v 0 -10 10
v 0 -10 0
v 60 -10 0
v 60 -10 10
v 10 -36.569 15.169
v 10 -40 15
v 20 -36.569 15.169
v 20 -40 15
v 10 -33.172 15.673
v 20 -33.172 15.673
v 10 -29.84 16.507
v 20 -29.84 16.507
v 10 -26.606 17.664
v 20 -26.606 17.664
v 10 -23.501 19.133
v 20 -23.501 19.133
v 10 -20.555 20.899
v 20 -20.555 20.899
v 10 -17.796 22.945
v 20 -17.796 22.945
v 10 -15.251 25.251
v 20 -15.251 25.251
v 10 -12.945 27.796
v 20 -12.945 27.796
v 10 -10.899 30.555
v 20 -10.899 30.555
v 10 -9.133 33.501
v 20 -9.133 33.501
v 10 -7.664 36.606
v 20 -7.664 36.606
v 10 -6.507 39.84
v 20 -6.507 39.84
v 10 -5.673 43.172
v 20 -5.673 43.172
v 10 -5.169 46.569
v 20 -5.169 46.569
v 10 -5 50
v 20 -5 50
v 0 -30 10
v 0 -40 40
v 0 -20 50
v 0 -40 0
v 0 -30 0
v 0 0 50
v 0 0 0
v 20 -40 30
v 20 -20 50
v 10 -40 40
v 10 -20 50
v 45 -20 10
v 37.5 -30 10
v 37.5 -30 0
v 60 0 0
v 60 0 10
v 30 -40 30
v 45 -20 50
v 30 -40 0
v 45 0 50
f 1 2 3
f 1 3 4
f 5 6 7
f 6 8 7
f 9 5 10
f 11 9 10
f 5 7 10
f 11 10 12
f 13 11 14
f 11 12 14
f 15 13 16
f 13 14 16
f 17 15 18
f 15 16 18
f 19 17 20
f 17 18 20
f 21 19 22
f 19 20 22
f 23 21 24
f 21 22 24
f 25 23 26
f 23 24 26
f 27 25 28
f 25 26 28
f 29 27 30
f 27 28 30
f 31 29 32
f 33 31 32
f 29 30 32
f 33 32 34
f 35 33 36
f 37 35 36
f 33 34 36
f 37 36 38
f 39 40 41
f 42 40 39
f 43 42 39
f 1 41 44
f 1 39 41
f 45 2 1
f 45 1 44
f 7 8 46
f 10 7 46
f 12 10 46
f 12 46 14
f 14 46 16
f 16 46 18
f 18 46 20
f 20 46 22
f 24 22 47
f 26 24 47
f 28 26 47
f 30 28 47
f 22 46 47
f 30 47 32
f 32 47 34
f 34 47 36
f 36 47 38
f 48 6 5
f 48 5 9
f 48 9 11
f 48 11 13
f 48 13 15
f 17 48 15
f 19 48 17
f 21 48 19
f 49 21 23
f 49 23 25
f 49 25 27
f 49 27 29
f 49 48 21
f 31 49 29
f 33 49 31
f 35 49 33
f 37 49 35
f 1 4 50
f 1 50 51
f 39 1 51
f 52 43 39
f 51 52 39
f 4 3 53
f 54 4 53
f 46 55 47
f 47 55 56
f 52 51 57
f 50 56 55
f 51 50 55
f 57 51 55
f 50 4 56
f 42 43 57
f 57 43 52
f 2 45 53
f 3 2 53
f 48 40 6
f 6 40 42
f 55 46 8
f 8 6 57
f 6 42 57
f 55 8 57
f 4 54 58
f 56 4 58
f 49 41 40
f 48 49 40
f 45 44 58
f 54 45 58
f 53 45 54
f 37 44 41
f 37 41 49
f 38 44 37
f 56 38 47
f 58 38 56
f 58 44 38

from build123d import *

# Parameters (mm, degrees)
F0_W      = 60
F0_H      = 40
F1_DEPTH  = 50
F3_W      = 10
F3_H      = 35
F5_DEPTH  = 35
F6_R      = 34.99999
F7_DEPTH  = 12.7
F9_DEPTH  = 40
F10_DEPTH = 50.001
F12_DEPTH = 20.001
F13_W     = 20
F13_H     = 10
F14_DEPTH = 60.001


# Not quite as in the source:
# - a fillet or chamfer is up to 0.001 mm smaller than in the source, because OpenCascade refuses the exact size


with BuildPart() as f1:
    # F0 (on Top) → F1 (new body)
    with BuildSketch(Plane.XY):
        with Locations((30, -20)):
            Rectangle(F0_W, F0_H)
    extrude(amount=F1_DEPTH)

    # F3 (on face) → F5 (cut, through all)
    with BuildSketch(Plane.XY.offset(50)):
        with Locations((15, -22.5)):
            Rectangle(F3_W, F3_H)
    extrude(amount=-F5_DEPTH, mode=Mode.SUBTRACT)

    # F6 (radius 35 in the source; OpenCascade refuses exactly that, so slightly less here)
    f6_edges = [f1.edges().sort_by_distance(p)[0] for p in [
        (15, -5, 15),
    ]]
    fillet(f6_edges, radius=F6_R)

    # F2 (on face) → F7 (cut)
    with BuildSketch(Plane(origin=(0, 0, 0), x_dir=(0, -1, 0), z_dir=(-1, 0, 0))):
        Polygon((40, 50), (20, 50), (40, 40), align=None)
    extrude(amount=-F7_DEPTH, mode=Mode.SUBTRACT)

    # F8 (on face) → F9 (cut, through all)
    with BuildSketch(Plane.YZ.offset(60)):
        Polygon((-40, 30), (-20, 50), (-40, 50), align=None)
    extrude(amount=-F9_DEPTH, mode=Mode.SUBTRACT)

    # F3 (on face) → F10 (cut, through all)
    with BuildSketch(Plane.XY.offset(50)):
        Polygon((45, -20), (30, -40), (60, -40), (60, -10), align=None)
    extrude(amount=-F10_DEPTH, mode=Mode.SUBTRACT)

    # F11 (on face) → F12 (cut, through all)
    with BuildSketch(Plane(origin=(0, 0, 0), x_dir=(-1, 0, 0), z_dir=(0, 1, 0))):
        Polygon((-60, 10), (-45, 50), (-60, 50), align=None)
    extrude(amount=-F12_DEPTH, mode=Mode.SUBTRACT)

    # F13 (on face) → F14 (cut, through all)
    with BuildSketch(Plane(origin=(0, 0, 0), x_dir=(0, -1, 0), z_dir=(-1, 0, 0))):
        with Locations((20, 5)):
            Rectangle(F13_W, F13_H)
    extrude(amount=-F14_DEPTH, mode=Mode.SUBTRACT)


solid = f1.part
